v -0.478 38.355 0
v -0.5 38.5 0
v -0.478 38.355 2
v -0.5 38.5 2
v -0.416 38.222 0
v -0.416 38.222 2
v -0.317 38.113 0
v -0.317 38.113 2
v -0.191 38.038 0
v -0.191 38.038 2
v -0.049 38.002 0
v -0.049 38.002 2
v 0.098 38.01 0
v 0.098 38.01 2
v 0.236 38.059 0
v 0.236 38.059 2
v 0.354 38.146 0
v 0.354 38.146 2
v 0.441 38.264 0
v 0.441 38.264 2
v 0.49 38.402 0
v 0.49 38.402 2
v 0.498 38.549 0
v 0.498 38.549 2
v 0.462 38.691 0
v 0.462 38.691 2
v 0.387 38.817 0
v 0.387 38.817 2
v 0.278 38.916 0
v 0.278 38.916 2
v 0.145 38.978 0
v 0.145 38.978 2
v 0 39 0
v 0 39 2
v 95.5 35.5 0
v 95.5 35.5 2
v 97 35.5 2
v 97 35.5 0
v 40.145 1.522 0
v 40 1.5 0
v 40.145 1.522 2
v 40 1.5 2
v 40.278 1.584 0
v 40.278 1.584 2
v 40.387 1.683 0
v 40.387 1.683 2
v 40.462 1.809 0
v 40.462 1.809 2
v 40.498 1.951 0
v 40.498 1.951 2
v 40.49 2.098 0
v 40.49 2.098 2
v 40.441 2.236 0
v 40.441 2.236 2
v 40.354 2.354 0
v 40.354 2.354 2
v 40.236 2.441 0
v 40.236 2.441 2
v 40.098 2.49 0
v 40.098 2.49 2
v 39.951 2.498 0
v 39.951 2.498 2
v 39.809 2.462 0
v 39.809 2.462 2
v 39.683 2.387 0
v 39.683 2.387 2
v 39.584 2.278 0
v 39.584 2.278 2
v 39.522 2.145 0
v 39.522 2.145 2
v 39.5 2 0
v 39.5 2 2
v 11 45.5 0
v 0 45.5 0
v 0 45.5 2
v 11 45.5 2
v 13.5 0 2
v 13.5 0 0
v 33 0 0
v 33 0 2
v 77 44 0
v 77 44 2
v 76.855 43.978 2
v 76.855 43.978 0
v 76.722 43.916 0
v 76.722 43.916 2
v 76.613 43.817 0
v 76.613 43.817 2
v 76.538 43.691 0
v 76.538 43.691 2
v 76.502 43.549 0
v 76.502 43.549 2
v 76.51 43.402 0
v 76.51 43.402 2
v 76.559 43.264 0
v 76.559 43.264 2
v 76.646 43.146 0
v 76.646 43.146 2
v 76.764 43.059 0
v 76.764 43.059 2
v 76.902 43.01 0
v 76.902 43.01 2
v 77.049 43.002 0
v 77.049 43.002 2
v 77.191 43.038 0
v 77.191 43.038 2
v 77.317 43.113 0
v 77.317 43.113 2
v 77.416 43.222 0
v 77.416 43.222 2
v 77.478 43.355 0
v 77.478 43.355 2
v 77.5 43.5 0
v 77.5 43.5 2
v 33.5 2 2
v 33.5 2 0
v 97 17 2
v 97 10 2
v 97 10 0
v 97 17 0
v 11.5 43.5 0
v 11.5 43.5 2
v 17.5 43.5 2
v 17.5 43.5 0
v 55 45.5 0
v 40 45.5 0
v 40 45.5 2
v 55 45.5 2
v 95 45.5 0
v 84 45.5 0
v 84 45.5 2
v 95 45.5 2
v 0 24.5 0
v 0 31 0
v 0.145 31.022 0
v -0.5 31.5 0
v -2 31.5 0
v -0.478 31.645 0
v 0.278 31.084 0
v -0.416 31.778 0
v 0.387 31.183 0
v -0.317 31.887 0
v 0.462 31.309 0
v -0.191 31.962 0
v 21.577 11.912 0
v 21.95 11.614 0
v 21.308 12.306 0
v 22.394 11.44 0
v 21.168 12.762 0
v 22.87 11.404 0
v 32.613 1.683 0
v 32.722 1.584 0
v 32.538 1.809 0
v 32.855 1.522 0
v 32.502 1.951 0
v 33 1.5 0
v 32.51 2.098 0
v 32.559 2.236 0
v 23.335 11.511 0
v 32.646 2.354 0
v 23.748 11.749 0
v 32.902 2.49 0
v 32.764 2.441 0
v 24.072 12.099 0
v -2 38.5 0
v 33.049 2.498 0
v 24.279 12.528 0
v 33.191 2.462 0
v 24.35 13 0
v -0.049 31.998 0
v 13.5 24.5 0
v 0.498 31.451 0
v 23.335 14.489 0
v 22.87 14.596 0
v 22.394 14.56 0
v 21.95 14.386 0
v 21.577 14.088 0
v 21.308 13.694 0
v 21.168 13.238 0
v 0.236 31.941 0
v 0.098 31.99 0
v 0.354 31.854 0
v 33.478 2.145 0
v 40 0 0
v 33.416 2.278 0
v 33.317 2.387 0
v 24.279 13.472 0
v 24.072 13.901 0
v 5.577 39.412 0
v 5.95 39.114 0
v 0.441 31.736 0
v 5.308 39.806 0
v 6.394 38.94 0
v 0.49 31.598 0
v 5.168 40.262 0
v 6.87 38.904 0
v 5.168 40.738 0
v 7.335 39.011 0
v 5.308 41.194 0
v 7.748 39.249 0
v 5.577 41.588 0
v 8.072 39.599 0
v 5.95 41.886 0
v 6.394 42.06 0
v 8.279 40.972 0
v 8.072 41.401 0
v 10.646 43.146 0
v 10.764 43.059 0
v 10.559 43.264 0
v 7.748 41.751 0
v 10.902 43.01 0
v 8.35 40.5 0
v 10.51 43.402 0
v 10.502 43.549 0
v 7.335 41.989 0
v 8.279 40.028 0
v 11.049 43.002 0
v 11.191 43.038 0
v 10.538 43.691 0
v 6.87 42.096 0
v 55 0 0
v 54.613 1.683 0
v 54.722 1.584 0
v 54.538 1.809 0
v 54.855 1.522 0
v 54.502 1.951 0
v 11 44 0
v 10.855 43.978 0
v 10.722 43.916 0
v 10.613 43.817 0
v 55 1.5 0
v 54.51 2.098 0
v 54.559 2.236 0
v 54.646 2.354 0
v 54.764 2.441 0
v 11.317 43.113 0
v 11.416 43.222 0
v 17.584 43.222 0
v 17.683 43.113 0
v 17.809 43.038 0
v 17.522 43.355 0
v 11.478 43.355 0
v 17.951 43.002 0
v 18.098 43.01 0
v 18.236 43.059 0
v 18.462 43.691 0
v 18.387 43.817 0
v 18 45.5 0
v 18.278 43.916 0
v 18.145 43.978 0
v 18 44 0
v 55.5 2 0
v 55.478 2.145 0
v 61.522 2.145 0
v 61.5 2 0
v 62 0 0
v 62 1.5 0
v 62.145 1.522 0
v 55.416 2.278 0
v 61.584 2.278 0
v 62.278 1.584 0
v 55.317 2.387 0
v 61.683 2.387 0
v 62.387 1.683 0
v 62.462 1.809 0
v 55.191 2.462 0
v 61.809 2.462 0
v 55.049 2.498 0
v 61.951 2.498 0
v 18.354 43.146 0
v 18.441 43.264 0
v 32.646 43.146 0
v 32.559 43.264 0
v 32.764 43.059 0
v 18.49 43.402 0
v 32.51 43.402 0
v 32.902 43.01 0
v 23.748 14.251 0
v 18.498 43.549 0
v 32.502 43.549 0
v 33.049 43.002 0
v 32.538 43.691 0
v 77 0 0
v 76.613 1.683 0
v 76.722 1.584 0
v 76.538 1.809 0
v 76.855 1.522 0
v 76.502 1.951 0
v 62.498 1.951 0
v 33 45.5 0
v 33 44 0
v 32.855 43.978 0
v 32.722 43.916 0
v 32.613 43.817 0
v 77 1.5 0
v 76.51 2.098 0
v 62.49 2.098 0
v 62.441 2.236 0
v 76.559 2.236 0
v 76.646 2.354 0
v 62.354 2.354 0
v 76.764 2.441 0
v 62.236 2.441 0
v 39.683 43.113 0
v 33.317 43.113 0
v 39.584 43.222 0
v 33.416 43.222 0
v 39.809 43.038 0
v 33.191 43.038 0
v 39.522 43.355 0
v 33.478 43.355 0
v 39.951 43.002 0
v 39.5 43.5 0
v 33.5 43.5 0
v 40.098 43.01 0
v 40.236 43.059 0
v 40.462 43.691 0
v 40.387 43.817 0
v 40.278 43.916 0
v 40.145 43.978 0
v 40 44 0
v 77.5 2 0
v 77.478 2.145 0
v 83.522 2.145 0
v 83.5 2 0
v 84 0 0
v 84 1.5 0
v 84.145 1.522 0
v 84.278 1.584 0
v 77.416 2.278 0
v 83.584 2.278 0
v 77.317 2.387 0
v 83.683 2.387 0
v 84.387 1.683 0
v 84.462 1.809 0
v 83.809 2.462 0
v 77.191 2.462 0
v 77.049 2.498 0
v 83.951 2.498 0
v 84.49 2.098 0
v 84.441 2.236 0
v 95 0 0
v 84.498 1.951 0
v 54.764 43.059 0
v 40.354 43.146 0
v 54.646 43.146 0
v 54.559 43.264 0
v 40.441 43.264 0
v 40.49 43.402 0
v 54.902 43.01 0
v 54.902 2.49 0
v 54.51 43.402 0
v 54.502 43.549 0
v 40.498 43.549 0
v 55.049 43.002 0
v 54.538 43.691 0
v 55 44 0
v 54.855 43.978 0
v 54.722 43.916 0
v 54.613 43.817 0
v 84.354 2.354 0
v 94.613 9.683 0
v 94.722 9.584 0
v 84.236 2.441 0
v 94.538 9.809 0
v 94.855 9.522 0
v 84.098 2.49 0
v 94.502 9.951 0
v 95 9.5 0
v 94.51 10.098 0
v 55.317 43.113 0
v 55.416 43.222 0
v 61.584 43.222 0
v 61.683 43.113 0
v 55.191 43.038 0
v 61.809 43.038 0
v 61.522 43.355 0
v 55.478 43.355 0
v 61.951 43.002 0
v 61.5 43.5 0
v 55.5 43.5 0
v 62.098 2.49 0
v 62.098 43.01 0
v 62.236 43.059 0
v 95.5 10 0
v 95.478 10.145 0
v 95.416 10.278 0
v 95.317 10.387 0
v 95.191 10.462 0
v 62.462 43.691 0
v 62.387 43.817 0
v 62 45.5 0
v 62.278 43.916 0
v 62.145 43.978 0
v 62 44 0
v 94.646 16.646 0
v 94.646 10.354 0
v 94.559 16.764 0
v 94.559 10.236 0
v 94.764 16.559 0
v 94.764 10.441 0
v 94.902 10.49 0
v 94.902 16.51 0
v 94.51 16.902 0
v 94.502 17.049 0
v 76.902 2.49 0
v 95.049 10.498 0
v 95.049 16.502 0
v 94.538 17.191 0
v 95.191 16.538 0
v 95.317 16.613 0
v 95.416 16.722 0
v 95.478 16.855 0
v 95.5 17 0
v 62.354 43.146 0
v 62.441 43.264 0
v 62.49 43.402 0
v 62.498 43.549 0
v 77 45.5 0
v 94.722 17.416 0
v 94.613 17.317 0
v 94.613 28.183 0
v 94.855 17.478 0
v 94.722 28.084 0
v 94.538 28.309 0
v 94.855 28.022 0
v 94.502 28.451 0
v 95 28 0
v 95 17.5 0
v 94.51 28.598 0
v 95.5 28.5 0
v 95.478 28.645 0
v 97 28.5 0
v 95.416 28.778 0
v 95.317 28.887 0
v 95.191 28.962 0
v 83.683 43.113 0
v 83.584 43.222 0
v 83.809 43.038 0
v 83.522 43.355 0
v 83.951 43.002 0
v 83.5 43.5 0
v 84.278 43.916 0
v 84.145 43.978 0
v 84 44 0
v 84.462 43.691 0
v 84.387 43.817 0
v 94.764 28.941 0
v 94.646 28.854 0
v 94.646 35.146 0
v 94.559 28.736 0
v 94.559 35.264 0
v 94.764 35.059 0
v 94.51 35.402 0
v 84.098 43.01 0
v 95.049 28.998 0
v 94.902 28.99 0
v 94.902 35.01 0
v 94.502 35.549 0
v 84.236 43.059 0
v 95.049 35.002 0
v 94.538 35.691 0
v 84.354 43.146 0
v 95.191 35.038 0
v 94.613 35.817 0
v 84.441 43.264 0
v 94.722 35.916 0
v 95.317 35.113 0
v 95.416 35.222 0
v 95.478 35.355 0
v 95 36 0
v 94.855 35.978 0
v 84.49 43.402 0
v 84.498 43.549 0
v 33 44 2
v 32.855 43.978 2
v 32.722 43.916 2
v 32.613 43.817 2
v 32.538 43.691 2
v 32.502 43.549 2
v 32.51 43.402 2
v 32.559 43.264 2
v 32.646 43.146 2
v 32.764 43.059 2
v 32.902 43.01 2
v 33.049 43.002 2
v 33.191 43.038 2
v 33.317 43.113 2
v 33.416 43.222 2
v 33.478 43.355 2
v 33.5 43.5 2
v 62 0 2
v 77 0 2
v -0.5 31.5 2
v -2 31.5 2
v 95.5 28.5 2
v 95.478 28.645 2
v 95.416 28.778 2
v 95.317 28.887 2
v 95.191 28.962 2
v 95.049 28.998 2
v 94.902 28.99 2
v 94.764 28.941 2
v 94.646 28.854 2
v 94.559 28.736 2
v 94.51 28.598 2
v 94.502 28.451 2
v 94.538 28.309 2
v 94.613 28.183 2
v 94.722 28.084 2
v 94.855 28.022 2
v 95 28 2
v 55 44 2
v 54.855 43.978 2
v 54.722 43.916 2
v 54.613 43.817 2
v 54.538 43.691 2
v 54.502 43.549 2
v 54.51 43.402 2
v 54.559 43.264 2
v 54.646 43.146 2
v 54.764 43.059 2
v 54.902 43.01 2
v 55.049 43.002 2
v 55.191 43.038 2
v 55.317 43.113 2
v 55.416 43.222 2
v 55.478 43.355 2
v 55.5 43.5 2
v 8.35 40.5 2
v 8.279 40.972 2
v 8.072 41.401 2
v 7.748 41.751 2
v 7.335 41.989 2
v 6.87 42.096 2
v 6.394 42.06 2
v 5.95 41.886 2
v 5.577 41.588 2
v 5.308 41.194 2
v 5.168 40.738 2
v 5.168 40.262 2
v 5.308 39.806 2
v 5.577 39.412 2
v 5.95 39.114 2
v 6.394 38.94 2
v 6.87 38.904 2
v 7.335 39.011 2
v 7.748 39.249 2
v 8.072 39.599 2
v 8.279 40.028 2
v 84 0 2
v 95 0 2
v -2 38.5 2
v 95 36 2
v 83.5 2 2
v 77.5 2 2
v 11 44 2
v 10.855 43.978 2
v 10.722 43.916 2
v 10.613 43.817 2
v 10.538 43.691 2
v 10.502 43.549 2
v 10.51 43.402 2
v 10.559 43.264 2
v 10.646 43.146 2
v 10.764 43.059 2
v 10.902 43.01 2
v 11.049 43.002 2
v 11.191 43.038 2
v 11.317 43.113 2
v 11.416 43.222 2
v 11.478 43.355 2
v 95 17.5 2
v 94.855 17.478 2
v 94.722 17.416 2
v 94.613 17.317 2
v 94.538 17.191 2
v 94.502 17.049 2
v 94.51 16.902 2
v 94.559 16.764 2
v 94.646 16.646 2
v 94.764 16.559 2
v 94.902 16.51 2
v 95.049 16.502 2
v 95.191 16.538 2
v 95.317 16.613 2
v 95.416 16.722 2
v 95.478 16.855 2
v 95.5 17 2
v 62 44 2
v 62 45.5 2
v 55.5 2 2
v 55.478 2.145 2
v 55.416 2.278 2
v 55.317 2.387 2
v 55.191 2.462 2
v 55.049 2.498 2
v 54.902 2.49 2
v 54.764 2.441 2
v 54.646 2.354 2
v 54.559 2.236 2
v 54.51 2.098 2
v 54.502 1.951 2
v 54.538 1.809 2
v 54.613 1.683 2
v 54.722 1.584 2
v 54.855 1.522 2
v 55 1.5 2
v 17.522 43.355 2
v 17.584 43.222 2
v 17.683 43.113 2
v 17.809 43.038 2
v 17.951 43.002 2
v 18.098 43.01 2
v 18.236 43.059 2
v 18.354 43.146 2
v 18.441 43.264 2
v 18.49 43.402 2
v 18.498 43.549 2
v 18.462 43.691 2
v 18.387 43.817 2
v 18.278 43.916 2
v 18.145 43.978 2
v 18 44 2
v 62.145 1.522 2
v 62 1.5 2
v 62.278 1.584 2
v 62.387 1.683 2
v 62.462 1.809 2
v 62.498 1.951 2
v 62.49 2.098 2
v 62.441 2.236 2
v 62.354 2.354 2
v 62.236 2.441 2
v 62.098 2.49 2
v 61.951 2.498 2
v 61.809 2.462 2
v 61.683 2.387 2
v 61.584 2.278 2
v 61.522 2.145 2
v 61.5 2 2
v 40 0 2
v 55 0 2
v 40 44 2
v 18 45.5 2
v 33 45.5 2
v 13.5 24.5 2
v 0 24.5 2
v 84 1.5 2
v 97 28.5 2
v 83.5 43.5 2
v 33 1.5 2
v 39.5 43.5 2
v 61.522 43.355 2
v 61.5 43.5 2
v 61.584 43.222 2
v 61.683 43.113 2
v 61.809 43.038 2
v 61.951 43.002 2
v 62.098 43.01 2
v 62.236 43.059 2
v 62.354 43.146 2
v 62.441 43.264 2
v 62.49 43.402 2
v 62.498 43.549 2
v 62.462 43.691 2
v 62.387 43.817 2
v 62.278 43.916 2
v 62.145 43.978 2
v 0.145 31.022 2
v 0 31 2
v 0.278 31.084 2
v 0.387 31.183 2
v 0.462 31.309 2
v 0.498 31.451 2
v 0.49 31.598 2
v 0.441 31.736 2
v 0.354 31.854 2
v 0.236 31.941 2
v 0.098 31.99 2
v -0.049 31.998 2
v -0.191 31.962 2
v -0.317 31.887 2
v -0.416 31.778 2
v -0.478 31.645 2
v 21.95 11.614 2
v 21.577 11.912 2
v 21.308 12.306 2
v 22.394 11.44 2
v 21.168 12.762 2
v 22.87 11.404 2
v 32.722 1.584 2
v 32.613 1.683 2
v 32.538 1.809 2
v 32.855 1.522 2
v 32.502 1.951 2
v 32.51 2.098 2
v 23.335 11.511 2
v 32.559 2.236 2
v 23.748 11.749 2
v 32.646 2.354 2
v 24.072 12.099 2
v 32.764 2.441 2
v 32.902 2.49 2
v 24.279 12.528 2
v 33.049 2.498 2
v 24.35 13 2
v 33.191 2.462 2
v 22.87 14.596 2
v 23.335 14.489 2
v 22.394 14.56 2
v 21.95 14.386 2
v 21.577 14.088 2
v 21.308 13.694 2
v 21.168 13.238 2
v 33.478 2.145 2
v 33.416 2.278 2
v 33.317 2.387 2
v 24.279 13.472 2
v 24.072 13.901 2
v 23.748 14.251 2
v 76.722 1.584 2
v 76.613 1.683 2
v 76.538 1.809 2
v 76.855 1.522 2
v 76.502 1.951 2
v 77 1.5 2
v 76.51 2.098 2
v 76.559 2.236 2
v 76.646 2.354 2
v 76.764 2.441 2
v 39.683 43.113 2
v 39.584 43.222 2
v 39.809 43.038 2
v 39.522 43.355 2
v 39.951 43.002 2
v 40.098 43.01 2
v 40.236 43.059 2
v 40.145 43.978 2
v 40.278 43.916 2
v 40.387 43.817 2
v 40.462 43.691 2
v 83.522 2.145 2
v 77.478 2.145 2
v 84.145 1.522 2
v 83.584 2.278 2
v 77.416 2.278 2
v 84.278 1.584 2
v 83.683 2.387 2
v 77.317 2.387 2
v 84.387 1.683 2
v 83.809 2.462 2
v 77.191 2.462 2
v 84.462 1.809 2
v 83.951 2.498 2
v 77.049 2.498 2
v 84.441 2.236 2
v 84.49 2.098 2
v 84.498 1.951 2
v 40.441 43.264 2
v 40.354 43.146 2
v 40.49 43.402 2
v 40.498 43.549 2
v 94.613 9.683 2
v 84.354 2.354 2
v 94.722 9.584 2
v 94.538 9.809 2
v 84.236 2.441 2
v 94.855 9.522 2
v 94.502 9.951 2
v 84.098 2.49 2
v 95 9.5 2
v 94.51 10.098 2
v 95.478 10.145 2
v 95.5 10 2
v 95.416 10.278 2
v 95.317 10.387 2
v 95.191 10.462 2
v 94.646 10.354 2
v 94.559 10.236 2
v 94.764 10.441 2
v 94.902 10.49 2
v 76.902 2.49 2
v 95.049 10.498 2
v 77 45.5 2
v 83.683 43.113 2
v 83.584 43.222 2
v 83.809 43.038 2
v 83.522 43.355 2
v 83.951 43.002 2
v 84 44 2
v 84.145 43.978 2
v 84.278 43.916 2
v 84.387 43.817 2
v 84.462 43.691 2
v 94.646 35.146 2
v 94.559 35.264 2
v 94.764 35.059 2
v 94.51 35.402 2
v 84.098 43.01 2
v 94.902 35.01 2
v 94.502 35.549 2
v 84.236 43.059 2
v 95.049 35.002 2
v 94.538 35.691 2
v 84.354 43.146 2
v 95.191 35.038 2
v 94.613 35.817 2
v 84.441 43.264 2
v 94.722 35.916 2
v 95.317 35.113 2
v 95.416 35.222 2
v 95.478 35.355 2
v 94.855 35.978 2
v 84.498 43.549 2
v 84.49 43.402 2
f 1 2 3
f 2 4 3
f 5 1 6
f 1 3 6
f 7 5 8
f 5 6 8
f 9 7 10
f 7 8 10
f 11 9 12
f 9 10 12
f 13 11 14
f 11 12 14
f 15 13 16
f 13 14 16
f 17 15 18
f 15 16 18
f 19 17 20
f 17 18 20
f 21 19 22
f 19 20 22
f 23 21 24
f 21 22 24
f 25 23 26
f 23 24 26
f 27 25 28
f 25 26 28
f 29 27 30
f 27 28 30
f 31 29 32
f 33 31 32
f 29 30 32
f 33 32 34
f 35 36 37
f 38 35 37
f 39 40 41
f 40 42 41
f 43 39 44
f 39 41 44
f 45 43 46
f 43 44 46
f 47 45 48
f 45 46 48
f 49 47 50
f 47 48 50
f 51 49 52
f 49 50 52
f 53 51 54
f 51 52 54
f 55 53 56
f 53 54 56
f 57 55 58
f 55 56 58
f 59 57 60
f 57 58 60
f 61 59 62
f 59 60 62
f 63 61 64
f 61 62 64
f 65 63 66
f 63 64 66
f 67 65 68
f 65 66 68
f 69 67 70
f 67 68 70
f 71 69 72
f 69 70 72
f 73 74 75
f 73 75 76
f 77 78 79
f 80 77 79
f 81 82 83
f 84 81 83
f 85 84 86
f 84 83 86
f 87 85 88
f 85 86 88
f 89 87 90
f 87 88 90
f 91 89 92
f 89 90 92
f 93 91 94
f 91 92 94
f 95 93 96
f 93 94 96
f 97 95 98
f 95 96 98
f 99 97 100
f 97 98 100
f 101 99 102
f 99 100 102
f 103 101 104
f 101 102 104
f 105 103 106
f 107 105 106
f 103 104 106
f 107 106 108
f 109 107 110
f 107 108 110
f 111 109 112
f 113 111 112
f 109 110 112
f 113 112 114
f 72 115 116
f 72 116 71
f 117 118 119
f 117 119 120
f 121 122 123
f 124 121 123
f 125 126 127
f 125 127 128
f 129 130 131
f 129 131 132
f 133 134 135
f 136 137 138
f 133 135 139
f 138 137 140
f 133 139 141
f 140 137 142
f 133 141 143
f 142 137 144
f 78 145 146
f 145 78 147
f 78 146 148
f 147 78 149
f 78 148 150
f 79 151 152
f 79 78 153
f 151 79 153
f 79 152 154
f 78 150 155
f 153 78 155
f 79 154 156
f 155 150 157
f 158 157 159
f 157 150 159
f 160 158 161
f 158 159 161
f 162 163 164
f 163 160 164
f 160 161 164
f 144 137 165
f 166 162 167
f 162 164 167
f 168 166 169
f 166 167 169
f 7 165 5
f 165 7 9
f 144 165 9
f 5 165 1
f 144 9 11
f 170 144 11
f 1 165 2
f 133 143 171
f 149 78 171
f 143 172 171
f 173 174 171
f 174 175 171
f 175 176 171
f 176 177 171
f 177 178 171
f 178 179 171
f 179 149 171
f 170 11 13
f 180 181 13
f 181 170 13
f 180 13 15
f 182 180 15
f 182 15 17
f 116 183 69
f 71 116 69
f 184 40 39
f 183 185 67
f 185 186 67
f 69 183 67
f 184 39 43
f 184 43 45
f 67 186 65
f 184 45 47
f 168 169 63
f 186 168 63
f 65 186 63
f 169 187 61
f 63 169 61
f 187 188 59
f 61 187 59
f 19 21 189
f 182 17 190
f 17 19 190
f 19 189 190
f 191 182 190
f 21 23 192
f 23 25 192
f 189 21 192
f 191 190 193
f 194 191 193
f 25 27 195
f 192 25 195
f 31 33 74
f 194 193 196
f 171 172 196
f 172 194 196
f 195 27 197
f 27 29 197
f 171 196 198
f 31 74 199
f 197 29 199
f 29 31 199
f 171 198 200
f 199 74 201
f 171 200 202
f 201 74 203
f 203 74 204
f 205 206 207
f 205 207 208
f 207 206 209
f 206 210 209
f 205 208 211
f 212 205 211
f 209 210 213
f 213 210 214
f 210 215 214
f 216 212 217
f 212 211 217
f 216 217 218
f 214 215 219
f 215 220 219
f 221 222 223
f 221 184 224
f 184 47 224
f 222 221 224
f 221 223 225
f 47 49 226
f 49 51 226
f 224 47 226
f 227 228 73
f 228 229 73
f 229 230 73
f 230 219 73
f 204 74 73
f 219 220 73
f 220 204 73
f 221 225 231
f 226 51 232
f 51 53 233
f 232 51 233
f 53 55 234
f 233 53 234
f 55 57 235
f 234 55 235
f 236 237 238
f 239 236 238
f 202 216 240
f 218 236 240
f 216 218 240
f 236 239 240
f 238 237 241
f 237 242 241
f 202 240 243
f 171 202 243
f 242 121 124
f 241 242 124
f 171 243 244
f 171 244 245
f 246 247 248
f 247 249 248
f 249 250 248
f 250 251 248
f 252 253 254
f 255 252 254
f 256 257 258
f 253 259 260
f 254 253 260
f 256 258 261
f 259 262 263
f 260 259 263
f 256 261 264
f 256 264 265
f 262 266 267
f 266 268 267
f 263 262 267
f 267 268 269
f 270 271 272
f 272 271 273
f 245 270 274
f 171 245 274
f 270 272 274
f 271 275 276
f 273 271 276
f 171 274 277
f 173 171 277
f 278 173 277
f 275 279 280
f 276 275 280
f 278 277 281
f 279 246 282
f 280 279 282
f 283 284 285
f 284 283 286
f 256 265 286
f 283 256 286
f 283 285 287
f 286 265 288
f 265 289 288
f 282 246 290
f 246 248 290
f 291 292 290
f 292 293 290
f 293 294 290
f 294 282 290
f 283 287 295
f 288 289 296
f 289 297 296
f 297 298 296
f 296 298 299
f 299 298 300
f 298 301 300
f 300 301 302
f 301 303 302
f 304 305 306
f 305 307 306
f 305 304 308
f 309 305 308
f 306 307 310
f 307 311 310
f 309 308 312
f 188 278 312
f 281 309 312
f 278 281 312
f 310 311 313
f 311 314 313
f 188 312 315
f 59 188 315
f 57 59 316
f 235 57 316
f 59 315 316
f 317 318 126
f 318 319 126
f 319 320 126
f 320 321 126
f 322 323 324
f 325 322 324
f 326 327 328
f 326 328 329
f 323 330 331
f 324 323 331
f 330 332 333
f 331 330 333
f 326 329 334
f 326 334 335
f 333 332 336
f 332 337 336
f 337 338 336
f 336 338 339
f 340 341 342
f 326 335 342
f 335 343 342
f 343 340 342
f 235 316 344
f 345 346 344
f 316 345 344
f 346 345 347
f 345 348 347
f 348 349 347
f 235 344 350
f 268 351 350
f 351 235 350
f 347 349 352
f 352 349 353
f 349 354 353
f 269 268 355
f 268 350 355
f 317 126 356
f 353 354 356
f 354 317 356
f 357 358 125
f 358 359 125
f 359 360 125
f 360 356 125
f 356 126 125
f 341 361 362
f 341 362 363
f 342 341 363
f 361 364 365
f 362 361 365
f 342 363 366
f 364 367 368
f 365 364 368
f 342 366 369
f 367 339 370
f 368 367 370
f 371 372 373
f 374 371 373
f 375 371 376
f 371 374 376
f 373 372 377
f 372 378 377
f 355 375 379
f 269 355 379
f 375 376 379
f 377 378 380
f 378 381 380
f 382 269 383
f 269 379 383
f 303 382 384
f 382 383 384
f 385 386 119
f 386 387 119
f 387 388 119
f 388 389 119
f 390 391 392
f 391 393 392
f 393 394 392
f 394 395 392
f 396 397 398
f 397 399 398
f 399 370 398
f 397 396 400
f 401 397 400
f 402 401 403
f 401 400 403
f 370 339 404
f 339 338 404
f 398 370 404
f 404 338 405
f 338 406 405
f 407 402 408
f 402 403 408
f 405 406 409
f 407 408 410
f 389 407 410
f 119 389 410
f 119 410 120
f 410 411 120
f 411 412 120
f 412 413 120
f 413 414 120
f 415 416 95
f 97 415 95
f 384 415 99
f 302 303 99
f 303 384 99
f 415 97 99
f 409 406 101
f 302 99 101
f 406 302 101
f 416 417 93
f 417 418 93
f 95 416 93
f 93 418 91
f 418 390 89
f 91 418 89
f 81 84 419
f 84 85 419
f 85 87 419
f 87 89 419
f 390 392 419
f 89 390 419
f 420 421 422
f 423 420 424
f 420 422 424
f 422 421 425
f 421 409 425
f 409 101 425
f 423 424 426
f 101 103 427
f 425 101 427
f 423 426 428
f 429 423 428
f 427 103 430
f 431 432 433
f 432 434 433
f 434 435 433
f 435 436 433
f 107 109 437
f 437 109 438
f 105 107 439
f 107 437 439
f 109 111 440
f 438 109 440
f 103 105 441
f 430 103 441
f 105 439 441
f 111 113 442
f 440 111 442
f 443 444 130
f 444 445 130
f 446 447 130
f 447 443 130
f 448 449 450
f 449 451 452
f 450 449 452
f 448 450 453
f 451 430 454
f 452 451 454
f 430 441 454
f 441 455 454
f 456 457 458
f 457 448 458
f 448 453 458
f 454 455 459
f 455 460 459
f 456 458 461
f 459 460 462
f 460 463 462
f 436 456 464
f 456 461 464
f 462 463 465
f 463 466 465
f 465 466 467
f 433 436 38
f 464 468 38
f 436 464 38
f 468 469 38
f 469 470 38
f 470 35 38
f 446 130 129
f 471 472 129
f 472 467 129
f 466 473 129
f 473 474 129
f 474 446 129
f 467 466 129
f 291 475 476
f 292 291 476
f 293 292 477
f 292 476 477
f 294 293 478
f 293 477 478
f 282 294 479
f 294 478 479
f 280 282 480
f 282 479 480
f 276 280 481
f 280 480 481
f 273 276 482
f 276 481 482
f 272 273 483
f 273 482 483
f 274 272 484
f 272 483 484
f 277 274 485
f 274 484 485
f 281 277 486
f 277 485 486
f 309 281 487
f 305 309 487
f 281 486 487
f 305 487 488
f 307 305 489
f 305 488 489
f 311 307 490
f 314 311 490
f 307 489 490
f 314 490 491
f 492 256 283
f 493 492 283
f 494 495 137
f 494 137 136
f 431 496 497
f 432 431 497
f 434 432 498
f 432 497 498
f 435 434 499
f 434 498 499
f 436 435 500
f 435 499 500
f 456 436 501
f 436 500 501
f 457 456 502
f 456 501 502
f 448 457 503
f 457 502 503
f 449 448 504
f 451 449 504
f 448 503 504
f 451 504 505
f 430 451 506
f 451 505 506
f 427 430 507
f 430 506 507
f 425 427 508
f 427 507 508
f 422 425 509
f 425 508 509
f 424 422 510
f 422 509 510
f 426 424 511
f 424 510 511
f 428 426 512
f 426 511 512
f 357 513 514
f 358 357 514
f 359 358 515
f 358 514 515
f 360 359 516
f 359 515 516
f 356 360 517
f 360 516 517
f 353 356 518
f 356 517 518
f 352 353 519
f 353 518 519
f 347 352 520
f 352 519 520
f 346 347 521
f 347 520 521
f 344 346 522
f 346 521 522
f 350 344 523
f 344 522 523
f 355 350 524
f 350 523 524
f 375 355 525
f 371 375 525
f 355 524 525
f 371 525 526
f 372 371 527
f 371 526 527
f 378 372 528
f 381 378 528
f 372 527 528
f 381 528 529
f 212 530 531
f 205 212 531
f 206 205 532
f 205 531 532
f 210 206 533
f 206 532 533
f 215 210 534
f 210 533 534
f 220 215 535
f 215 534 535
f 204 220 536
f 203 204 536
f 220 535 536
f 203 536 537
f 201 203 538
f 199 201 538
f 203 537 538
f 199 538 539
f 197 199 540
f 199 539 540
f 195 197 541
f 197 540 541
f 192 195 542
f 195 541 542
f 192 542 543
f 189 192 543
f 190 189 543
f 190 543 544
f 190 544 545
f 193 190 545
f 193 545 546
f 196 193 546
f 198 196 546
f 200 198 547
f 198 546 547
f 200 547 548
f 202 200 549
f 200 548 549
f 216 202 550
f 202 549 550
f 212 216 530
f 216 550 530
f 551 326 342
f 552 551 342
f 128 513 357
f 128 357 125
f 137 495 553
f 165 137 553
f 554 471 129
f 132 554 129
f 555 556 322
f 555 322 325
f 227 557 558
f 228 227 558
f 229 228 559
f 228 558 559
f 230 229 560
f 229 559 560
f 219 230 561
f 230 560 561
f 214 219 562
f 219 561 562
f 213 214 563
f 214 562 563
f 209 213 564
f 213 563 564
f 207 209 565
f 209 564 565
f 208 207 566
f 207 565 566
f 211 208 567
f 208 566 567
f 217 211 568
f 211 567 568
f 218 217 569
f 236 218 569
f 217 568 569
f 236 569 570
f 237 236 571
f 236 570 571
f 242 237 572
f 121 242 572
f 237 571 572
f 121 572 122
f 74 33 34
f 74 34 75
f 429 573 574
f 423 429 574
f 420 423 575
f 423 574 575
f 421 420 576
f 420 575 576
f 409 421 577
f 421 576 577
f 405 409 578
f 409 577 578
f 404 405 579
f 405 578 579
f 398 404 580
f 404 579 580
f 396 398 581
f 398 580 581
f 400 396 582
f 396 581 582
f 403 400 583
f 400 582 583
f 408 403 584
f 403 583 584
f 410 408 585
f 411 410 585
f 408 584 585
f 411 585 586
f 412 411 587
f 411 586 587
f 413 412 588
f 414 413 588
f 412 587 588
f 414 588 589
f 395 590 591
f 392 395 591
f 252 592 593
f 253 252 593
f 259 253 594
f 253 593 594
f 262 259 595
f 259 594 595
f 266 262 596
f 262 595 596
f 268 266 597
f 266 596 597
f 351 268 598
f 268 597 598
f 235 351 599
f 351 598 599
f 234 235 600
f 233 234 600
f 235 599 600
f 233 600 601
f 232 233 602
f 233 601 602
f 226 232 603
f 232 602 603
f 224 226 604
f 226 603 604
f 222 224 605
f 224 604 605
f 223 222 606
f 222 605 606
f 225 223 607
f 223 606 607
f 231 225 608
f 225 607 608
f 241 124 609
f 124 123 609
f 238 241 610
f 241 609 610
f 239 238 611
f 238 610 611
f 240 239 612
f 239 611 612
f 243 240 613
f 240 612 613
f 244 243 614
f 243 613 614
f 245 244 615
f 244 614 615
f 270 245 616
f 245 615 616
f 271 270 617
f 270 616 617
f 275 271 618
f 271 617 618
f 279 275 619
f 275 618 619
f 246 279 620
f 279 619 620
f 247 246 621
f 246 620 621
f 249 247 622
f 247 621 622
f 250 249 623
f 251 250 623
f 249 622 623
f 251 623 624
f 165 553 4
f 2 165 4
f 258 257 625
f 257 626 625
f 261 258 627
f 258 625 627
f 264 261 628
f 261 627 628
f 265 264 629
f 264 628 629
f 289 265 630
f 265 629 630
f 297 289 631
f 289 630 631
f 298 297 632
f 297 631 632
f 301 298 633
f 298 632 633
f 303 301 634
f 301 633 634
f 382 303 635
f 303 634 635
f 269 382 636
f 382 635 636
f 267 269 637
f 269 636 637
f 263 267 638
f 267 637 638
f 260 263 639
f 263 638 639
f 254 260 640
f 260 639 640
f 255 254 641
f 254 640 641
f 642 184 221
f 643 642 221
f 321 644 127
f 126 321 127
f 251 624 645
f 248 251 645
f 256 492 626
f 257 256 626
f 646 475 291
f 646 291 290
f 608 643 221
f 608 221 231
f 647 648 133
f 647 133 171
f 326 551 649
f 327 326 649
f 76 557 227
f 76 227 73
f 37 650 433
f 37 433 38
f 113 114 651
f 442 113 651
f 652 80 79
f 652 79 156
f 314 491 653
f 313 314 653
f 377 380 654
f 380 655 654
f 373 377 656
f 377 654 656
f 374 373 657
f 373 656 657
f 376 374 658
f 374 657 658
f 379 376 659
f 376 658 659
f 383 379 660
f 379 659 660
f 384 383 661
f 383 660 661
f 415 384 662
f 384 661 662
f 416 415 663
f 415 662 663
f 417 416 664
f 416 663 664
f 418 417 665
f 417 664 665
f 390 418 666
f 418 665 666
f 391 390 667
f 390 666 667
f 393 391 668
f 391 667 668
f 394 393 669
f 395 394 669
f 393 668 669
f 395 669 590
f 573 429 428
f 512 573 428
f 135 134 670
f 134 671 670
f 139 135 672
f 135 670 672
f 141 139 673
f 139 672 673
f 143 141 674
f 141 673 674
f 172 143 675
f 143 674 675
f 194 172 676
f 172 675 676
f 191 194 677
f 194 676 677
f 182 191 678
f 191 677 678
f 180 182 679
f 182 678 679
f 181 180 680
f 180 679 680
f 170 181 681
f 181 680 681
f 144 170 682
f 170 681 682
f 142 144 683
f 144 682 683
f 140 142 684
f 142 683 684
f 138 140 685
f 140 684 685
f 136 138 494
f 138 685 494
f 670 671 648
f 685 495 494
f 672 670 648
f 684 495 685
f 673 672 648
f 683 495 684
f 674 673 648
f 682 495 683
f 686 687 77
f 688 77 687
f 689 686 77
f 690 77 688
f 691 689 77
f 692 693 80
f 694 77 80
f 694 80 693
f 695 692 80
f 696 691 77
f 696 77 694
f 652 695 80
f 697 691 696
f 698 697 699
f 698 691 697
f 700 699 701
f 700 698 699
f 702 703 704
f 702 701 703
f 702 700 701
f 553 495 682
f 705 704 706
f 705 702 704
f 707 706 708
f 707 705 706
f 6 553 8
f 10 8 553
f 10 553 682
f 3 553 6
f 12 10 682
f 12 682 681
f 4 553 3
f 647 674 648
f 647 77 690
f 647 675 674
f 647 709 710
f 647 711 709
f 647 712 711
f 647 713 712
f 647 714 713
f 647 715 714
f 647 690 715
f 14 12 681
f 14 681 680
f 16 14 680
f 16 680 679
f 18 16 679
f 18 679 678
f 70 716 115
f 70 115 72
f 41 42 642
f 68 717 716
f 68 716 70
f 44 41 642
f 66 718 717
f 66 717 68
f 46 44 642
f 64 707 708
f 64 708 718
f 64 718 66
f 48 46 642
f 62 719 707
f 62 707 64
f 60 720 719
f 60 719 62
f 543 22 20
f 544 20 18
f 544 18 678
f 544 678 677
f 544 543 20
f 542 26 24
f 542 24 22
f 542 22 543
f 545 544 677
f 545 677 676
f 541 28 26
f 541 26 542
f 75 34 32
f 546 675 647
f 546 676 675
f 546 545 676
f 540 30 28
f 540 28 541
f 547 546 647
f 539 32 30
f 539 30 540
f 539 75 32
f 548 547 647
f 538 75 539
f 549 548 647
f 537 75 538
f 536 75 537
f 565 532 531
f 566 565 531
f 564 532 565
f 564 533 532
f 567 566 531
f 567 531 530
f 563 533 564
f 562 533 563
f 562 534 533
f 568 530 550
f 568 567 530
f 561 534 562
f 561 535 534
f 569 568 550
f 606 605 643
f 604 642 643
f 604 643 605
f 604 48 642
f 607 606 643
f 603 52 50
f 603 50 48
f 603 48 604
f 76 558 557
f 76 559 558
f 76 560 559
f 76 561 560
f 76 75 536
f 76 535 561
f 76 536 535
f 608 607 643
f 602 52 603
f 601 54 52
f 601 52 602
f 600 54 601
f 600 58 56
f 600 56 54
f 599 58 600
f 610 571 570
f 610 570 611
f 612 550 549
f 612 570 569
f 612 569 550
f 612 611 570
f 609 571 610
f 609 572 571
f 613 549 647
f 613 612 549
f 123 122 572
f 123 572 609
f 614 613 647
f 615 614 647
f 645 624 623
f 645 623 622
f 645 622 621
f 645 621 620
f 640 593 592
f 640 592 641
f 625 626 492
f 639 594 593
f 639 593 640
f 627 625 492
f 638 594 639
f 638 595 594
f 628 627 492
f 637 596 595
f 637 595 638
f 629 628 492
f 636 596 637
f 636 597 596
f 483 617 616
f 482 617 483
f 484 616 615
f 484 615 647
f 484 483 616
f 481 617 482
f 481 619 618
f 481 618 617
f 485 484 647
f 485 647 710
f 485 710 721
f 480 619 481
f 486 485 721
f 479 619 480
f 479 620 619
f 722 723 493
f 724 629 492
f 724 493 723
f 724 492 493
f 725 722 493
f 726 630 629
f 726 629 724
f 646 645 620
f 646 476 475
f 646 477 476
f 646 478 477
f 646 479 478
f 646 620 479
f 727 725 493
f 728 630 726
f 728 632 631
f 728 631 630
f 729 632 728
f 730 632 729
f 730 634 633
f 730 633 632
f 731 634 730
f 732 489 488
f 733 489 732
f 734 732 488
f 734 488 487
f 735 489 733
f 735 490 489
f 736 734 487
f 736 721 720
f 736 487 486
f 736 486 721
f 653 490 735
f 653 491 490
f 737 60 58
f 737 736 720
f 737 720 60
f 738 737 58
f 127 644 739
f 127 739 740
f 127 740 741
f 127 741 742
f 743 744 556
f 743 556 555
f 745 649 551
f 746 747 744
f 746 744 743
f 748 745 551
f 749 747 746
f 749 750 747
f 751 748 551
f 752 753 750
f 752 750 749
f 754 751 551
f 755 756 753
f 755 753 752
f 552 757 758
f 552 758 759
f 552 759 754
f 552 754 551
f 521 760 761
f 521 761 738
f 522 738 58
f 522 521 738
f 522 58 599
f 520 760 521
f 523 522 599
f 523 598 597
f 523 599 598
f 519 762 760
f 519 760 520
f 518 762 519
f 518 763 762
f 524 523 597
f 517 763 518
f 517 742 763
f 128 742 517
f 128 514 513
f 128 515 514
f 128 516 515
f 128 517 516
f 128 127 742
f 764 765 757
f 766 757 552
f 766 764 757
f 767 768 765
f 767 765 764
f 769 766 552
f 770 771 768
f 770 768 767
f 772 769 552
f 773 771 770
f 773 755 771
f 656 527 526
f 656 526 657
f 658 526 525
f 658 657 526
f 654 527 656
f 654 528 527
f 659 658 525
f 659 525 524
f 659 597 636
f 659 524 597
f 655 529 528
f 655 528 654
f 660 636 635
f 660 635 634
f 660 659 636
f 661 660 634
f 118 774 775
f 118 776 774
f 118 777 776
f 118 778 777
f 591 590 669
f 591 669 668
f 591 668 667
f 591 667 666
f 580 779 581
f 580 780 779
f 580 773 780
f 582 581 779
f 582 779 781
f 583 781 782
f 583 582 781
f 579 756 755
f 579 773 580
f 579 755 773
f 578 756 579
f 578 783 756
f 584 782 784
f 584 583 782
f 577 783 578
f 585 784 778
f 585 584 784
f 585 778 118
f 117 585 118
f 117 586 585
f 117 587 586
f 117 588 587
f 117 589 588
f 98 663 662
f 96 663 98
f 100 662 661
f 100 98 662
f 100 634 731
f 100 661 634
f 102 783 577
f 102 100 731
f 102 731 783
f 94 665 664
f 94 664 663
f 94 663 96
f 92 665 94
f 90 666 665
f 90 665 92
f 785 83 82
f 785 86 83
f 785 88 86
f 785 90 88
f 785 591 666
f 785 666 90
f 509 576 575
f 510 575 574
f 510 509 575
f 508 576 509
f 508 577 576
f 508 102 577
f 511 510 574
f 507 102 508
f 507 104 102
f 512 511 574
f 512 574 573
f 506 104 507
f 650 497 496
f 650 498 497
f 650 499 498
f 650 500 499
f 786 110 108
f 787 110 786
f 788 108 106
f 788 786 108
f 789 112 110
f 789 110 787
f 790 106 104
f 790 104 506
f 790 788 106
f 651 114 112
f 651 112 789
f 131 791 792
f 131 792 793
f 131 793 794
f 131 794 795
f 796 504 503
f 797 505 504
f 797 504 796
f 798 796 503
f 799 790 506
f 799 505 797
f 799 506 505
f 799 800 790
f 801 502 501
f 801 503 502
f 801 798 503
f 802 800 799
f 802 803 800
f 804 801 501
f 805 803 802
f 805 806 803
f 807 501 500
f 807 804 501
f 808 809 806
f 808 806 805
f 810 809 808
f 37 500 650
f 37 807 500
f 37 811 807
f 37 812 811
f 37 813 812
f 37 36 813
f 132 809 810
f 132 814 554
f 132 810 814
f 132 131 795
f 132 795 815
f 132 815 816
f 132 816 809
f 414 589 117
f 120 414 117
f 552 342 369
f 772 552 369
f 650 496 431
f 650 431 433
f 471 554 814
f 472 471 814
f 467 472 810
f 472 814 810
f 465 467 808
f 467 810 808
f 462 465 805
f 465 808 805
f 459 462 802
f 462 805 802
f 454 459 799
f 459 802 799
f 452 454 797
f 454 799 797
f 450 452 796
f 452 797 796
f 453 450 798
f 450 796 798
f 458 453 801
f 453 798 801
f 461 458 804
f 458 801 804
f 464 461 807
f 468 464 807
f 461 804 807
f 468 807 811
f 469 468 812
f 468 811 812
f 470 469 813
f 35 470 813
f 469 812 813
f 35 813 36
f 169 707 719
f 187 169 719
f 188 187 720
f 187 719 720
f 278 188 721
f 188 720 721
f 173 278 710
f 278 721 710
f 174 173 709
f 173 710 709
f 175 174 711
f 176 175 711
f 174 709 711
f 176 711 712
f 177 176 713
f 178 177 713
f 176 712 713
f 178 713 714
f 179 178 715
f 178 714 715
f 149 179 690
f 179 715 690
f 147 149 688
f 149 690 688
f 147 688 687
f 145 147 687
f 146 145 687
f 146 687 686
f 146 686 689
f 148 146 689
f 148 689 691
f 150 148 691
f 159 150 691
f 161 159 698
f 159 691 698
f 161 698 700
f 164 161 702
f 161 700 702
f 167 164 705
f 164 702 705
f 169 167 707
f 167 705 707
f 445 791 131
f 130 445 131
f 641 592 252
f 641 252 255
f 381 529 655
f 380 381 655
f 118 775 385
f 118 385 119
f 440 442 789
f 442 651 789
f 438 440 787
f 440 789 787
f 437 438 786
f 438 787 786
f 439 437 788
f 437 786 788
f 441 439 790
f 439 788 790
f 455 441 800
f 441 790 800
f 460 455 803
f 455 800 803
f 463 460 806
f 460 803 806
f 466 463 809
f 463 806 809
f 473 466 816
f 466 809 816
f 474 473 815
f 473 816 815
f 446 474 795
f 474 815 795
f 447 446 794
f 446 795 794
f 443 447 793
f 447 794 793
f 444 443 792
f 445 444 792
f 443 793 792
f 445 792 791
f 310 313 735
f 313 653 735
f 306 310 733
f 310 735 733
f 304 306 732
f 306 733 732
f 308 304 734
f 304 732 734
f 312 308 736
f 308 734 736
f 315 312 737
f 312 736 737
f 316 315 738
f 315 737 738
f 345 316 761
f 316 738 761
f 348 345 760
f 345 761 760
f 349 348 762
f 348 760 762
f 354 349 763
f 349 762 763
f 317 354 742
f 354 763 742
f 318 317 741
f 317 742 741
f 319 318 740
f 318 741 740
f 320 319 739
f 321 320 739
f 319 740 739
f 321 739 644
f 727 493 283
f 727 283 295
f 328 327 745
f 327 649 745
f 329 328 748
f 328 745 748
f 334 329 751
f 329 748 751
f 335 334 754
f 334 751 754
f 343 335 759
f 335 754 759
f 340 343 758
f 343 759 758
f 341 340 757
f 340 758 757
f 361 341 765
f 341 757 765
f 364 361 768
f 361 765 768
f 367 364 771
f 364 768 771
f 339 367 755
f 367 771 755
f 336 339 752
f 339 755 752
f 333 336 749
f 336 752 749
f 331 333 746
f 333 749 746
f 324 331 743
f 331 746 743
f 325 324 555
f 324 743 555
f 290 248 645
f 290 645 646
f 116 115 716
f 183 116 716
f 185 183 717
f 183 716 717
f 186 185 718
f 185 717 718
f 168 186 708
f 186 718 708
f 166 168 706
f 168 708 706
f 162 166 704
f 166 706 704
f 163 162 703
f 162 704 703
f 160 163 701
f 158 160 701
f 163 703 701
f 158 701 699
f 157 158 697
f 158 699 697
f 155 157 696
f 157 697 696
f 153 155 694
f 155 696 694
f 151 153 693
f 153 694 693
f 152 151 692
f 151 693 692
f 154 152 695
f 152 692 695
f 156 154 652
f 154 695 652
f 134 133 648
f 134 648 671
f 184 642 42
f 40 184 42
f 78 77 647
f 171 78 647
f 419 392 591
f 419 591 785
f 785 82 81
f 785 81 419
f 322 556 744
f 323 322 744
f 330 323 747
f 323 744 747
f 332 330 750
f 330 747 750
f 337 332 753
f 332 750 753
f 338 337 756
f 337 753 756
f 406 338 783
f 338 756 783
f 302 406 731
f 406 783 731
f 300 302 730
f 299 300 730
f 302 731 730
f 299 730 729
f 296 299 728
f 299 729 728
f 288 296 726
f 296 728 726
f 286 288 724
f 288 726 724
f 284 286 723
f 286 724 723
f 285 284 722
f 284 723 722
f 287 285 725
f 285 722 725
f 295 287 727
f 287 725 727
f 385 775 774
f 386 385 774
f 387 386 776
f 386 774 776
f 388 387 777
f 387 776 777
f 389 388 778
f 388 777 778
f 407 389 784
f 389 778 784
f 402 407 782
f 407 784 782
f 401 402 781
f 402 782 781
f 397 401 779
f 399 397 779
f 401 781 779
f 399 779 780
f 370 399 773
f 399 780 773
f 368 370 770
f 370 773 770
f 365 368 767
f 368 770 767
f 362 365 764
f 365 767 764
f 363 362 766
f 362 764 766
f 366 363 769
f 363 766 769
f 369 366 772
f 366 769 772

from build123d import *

# Parameters (mm, degrees)
SKETCH_1_W          = 95
SKETCH_1_H          = 45.5
EXTRUDE_1_DEPTH     = 2
SKETCH_2_W          = 7
SKETCH_2_H          = 2
CUT_EXTRUDE_1_DEPTH = 106.352978126
SKETCH_3_R          = 0.5
CUT_EXTRUDE_2_DEPTH = 106.352978126
SKETCH_5_W          = 13.5
SKETCH_5_H          = 24.5
CUT_EXTRUDE_3_DEPTH = 106.352978126
SKETCH_6_W          = 2
SKETCH_6_H          = 7
EXTRUDE_2_DEPTH     = 2
SKETCH_7_R          = 1.6
CUT_EXTRUDE_4_DEPTH = 2


with BuildPart() as part:
    # 草图1 → 凸台-拉伸1 (new body)
    with BuildSketch(Plane.XY):
        with Locations((47.5, 22.75)):
            Rectangle(SKETCH_1_W, SKETCH_1_H)
    extrude(amount=EXTRUDE_1_DEPTH)

    # 草图2 → 切除-拉伸1 (cut, through all)
    with BuildSketch(Plane.XY.offset(2)):
        with Locations((58.5, 44.5)):
            Rectangle(SKETCH_2_W, SKETCH_2_H)
        with Locations((36.5, 44.5)):
            Rectangle(SKETCH_2_W, SKETCH_2_H)
        with Locations((14.5, 44.5)):
            Rectangle(SKETCH_2_W, SKETCH_2_H)
        with Locations((80.5, 44.5)):
            Rectangle(SKETCH_2_W, SKETCH_2_H)
        with Locations((36.5, 1)):
            Rectangle(SKETCH_2_W, SKETCH_2_H)
        with Locations((58.5, 1)):
            Rectangle(SKETCH_2_W, SKETCH_2_H)
        with Locations((80.5, 1)):
            Rectangle(SKETCH_2_W, SKETCH_2_H)
    extrude(amount=-CUT_EXTRUDE_1_DEPTH, mode=Mode.SUBTRACT)

    # 草图3 → 切除-拉伸2 (cut, through all)
    with BuildSketch(Plane.XY.offset(2)):
        with Locations((11, 43.5)):
            Circle(SKETCH_3_R)
    cut_extrude_2 = extrude(amount=-CUT_EXTRUDE_2_DEPTH, mode=Mode.SUBTRACT)

    # 草图5 → 切除-拉伸3 (cut, through all)
    with BuildSketch(Plane.XY.offset(2)):
        with Locations((6.75, 12.25)):
            Rectangle(SKETCH_5_W, SKETCH_5_H)
    extrude(amount=-CUT_EXTRUDE_3_DEPTH, mode=Mode.SUBTRACT)

    # 草图6 → 凸台-拉伸2 (add)
    with BuildSketch(Plane.XY.offset(2)):
        with Locations((-1, 35)):
            Rectangle(SKETCH_6_W, SKETCH_6_H)
        with Locations((96, 32)):
            Rectangle(SKETCH_6_W, SKETCH_6_H)
        with Locations((96, 13.5)):
            Rectangle(SKETCH_6_W, SKETCH_6_H)
    extrude(amount=-EXTRUDE_2_DEPTH)

    # 草图阵列1: 切除-拉伸2 at 19 more places
    with Locations((7, 0, 0), (22, 0, 0), (29, 0, 0), (44, 0, 0), (51, 0, 0), (66, 0, 0), (73, 0, 0), (73, -41.5, 0), (66, -41.5, 0), (51, -41.5, 0), (44, -41.5, 0), (29, -41.5, 0), (22, -41.5, 0), (-11, -12, 0), (84, -8, 0), (-11, -5, 0), (84, -15, 0), (84, -26.5, 0), (84, -33.5, 0)):
        add(cut_extrude_2, mode=Mode.SUBTRACT)

    # 草图7 → 切除-拉伸4 (cut)
    with BuildSketch(Plane.XY.offset(2)):
        with Locations((6.75, 40.5)):
            Circle(SKETCH_7_R)
        with Locations((22.75, 13)):
            Circle(SKETCH_7_R)
    extrude(amount=-CUT_EXTRUDE_4_DEPTH, mode=Mode.SUBTRACT)


solid = part.part
